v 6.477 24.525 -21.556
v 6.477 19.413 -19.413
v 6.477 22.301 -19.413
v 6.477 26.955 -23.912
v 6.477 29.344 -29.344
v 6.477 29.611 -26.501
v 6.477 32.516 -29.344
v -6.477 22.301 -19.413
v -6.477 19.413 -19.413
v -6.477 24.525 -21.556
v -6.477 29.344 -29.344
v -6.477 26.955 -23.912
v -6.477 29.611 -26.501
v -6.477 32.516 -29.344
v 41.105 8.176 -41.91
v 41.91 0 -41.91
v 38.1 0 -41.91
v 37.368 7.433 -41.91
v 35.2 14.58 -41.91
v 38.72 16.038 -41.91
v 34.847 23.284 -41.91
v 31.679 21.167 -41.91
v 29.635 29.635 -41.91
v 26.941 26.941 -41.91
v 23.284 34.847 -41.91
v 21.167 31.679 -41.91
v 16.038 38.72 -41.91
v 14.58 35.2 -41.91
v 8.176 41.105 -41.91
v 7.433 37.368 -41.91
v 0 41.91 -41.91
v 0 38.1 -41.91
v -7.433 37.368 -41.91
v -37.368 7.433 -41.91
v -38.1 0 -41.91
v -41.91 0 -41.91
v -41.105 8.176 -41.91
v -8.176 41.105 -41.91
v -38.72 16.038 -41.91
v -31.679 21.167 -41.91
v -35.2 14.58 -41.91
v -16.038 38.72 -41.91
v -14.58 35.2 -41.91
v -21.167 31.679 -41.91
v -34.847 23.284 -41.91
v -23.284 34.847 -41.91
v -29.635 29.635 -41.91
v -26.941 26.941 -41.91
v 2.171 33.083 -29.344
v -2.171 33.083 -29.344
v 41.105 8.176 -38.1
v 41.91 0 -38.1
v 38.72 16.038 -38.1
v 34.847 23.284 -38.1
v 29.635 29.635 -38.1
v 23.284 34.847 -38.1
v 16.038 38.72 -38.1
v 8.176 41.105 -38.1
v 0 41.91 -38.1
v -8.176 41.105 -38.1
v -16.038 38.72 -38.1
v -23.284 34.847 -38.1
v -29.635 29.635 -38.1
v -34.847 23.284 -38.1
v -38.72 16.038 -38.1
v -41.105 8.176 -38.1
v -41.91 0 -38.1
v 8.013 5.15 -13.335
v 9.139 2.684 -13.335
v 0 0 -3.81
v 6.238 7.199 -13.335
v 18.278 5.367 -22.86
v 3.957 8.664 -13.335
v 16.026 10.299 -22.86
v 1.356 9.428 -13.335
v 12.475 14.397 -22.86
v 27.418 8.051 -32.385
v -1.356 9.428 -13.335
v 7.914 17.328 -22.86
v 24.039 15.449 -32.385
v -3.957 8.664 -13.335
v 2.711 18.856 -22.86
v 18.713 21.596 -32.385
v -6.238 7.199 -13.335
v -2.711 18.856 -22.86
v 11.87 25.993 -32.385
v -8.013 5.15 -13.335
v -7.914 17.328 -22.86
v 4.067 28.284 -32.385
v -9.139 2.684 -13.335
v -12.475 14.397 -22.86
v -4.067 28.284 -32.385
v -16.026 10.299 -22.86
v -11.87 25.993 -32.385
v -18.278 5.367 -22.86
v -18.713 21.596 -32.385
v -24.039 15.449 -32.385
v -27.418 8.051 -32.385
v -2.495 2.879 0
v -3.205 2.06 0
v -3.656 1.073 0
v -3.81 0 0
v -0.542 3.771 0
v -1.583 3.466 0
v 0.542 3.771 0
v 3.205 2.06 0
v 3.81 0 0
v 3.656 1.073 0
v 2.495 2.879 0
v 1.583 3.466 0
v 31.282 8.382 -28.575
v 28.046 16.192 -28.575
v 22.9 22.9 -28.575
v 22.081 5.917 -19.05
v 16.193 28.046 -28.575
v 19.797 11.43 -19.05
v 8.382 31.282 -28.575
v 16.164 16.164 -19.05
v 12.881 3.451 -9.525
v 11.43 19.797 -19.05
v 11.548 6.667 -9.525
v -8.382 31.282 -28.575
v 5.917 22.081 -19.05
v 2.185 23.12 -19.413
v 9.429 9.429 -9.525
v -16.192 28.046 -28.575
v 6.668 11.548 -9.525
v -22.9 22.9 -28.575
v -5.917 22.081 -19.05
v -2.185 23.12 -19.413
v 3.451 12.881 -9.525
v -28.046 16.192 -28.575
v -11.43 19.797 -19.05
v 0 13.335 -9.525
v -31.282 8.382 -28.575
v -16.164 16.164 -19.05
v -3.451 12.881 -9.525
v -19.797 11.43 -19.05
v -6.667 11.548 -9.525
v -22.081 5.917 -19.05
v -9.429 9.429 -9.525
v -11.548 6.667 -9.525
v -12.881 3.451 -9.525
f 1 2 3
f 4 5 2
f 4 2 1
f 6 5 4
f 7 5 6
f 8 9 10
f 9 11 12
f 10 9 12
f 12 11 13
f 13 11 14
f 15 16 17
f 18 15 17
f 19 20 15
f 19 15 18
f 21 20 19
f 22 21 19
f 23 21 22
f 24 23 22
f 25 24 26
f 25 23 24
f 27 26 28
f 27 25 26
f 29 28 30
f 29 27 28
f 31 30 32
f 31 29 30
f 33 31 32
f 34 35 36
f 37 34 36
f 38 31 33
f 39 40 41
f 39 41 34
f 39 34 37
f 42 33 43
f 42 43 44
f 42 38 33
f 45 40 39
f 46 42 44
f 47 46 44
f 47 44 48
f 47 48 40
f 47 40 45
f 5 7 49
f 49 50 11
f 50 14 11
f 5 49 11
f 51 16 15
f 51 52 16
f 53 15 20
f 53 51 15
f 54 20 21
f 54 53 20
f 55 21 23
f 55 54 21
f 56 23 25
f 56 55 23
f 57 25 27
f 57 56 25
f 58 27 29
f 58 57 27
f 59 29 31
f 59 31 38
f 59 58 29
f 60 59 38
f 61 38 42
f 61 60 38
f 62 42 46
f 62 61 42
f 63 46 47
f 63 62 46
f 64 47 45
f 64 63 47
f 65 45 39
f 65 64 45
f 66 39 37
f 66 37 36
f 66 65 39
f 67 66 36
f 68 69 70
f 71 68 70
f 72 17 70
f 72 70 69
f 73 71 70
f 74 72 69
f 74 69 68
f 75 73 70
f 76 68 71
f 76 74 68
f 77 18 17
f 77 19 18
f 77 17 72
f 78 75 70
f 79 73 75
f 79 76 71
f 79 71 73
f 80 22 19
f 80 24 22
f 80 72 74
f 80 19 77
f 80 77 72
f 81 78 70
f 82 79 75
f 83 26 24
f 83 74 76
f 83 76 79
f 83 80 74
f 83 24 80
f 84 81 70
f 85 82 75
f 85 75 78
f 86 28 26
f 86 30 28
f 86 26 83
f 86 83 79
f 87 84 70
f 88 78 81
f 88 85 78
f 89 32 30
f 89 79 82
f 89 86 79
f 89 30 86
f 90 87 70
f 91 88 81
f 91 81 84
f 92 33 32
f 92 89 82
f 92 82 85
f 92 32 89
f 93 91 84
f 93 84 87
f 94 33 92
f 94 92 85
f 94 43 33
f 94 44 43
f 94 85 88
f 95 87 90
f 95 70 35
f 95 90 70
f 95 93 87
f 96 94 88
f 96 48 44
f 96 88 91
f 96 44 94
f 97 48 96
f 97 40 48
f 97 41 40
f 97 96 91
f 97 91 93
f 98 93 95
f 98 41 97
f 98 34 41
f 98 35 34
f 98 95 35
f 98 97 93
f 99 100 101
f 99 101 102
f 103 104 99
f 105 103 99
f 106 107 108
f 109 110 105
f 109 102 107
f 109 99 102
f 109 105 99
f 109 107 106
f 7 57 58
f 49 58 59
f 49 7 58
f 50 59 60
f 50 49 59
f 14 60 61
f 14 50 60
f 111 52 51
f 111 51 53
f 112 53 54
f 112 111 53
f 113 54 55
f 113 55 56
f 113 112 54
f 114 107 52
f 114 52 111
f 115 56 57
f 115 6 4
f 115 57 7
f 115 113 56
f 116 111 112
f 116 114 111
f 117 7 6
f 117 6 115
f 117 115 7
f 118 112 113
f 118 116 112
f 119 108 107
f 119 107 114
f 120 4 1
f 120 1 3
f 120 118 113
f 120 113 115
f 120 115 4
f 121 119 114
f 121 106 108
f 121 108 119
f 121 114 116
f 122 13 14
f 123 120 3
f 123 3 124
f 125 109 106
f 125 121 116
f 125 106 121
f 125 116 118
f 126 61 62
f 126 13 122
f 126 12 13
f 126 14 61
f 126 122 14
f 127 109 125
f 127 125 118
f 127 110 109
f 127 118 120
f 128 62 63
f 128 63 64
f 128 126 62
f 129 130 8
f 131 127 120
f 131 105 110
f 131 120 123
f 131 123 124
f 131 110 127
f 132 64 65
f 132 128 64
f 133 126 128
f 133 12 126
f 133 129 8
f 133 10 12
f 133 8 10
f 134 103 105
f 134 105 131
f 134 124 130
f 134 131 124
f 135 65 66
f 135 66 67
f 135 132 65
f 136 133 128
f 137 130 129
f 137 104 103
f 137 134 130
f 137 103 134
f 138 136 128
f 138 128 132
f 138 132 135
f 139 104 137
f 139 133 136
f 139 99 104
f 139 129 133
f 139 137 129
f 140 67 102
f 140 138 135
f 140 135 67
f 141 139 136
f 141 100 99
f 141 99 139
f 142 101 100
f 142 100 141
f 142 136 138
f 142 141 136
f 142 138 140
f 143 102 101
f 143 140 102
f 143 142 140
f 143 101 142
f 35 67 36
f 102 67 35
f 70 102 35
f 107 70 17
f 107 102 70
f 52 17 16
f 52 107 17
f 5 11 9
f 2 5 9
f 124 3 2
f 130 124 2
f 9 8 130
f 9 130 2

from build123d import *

# Parameters (mm, degrees)
REVOLVE2_ANGLE          = 180
CUT_EXTRUDE1_DEPTH      = 6.477
CUT_EXTRUDE1_DEPTH_BACK = 6.477


# Read off the part's stored shape, not the designer's step: Revolve2
with BuildPart() as part:
    # Revolve2 outline → Revolve2 (revolve)
    with BuildSketch(Plane.XZ):
        Polygon((3.81, 0), (0, 0), (0, -3.81), (38.1, -41.91), (41.91, -41.91), (41.91, -38.1), align=None)
    revolve(axis=Axis((0, 0, 0), (0, 0, 1)), revolution_arc=REVOLVE2_ANGLE)

    # Sketch6 → Cut-Extrude1 (cut, two sides: drawn at the far end of the back side and taken through both)
    with BuildSketch(Plane(origin=(0, 0, 0), x_dir=(0, 0, -1), z_dir=(1, 0, 0)).offset(-CUT_EXTRUDE1_DEPTH_BACK)):
        Polygon((19.412948776, 19.412948776), (19.412948776, 29.318948776), (19.412948776, 36.223650293), (29.344348776, 36.223650293), (29.344348776, 29.344348776), align=None)
    extrude(amount=CUT_EXTRUDE1_DEPTH + CUT_EXTRUDE1_DEPTH_BACK, mode=Mode.SUBTRACT)


solid = part.part
